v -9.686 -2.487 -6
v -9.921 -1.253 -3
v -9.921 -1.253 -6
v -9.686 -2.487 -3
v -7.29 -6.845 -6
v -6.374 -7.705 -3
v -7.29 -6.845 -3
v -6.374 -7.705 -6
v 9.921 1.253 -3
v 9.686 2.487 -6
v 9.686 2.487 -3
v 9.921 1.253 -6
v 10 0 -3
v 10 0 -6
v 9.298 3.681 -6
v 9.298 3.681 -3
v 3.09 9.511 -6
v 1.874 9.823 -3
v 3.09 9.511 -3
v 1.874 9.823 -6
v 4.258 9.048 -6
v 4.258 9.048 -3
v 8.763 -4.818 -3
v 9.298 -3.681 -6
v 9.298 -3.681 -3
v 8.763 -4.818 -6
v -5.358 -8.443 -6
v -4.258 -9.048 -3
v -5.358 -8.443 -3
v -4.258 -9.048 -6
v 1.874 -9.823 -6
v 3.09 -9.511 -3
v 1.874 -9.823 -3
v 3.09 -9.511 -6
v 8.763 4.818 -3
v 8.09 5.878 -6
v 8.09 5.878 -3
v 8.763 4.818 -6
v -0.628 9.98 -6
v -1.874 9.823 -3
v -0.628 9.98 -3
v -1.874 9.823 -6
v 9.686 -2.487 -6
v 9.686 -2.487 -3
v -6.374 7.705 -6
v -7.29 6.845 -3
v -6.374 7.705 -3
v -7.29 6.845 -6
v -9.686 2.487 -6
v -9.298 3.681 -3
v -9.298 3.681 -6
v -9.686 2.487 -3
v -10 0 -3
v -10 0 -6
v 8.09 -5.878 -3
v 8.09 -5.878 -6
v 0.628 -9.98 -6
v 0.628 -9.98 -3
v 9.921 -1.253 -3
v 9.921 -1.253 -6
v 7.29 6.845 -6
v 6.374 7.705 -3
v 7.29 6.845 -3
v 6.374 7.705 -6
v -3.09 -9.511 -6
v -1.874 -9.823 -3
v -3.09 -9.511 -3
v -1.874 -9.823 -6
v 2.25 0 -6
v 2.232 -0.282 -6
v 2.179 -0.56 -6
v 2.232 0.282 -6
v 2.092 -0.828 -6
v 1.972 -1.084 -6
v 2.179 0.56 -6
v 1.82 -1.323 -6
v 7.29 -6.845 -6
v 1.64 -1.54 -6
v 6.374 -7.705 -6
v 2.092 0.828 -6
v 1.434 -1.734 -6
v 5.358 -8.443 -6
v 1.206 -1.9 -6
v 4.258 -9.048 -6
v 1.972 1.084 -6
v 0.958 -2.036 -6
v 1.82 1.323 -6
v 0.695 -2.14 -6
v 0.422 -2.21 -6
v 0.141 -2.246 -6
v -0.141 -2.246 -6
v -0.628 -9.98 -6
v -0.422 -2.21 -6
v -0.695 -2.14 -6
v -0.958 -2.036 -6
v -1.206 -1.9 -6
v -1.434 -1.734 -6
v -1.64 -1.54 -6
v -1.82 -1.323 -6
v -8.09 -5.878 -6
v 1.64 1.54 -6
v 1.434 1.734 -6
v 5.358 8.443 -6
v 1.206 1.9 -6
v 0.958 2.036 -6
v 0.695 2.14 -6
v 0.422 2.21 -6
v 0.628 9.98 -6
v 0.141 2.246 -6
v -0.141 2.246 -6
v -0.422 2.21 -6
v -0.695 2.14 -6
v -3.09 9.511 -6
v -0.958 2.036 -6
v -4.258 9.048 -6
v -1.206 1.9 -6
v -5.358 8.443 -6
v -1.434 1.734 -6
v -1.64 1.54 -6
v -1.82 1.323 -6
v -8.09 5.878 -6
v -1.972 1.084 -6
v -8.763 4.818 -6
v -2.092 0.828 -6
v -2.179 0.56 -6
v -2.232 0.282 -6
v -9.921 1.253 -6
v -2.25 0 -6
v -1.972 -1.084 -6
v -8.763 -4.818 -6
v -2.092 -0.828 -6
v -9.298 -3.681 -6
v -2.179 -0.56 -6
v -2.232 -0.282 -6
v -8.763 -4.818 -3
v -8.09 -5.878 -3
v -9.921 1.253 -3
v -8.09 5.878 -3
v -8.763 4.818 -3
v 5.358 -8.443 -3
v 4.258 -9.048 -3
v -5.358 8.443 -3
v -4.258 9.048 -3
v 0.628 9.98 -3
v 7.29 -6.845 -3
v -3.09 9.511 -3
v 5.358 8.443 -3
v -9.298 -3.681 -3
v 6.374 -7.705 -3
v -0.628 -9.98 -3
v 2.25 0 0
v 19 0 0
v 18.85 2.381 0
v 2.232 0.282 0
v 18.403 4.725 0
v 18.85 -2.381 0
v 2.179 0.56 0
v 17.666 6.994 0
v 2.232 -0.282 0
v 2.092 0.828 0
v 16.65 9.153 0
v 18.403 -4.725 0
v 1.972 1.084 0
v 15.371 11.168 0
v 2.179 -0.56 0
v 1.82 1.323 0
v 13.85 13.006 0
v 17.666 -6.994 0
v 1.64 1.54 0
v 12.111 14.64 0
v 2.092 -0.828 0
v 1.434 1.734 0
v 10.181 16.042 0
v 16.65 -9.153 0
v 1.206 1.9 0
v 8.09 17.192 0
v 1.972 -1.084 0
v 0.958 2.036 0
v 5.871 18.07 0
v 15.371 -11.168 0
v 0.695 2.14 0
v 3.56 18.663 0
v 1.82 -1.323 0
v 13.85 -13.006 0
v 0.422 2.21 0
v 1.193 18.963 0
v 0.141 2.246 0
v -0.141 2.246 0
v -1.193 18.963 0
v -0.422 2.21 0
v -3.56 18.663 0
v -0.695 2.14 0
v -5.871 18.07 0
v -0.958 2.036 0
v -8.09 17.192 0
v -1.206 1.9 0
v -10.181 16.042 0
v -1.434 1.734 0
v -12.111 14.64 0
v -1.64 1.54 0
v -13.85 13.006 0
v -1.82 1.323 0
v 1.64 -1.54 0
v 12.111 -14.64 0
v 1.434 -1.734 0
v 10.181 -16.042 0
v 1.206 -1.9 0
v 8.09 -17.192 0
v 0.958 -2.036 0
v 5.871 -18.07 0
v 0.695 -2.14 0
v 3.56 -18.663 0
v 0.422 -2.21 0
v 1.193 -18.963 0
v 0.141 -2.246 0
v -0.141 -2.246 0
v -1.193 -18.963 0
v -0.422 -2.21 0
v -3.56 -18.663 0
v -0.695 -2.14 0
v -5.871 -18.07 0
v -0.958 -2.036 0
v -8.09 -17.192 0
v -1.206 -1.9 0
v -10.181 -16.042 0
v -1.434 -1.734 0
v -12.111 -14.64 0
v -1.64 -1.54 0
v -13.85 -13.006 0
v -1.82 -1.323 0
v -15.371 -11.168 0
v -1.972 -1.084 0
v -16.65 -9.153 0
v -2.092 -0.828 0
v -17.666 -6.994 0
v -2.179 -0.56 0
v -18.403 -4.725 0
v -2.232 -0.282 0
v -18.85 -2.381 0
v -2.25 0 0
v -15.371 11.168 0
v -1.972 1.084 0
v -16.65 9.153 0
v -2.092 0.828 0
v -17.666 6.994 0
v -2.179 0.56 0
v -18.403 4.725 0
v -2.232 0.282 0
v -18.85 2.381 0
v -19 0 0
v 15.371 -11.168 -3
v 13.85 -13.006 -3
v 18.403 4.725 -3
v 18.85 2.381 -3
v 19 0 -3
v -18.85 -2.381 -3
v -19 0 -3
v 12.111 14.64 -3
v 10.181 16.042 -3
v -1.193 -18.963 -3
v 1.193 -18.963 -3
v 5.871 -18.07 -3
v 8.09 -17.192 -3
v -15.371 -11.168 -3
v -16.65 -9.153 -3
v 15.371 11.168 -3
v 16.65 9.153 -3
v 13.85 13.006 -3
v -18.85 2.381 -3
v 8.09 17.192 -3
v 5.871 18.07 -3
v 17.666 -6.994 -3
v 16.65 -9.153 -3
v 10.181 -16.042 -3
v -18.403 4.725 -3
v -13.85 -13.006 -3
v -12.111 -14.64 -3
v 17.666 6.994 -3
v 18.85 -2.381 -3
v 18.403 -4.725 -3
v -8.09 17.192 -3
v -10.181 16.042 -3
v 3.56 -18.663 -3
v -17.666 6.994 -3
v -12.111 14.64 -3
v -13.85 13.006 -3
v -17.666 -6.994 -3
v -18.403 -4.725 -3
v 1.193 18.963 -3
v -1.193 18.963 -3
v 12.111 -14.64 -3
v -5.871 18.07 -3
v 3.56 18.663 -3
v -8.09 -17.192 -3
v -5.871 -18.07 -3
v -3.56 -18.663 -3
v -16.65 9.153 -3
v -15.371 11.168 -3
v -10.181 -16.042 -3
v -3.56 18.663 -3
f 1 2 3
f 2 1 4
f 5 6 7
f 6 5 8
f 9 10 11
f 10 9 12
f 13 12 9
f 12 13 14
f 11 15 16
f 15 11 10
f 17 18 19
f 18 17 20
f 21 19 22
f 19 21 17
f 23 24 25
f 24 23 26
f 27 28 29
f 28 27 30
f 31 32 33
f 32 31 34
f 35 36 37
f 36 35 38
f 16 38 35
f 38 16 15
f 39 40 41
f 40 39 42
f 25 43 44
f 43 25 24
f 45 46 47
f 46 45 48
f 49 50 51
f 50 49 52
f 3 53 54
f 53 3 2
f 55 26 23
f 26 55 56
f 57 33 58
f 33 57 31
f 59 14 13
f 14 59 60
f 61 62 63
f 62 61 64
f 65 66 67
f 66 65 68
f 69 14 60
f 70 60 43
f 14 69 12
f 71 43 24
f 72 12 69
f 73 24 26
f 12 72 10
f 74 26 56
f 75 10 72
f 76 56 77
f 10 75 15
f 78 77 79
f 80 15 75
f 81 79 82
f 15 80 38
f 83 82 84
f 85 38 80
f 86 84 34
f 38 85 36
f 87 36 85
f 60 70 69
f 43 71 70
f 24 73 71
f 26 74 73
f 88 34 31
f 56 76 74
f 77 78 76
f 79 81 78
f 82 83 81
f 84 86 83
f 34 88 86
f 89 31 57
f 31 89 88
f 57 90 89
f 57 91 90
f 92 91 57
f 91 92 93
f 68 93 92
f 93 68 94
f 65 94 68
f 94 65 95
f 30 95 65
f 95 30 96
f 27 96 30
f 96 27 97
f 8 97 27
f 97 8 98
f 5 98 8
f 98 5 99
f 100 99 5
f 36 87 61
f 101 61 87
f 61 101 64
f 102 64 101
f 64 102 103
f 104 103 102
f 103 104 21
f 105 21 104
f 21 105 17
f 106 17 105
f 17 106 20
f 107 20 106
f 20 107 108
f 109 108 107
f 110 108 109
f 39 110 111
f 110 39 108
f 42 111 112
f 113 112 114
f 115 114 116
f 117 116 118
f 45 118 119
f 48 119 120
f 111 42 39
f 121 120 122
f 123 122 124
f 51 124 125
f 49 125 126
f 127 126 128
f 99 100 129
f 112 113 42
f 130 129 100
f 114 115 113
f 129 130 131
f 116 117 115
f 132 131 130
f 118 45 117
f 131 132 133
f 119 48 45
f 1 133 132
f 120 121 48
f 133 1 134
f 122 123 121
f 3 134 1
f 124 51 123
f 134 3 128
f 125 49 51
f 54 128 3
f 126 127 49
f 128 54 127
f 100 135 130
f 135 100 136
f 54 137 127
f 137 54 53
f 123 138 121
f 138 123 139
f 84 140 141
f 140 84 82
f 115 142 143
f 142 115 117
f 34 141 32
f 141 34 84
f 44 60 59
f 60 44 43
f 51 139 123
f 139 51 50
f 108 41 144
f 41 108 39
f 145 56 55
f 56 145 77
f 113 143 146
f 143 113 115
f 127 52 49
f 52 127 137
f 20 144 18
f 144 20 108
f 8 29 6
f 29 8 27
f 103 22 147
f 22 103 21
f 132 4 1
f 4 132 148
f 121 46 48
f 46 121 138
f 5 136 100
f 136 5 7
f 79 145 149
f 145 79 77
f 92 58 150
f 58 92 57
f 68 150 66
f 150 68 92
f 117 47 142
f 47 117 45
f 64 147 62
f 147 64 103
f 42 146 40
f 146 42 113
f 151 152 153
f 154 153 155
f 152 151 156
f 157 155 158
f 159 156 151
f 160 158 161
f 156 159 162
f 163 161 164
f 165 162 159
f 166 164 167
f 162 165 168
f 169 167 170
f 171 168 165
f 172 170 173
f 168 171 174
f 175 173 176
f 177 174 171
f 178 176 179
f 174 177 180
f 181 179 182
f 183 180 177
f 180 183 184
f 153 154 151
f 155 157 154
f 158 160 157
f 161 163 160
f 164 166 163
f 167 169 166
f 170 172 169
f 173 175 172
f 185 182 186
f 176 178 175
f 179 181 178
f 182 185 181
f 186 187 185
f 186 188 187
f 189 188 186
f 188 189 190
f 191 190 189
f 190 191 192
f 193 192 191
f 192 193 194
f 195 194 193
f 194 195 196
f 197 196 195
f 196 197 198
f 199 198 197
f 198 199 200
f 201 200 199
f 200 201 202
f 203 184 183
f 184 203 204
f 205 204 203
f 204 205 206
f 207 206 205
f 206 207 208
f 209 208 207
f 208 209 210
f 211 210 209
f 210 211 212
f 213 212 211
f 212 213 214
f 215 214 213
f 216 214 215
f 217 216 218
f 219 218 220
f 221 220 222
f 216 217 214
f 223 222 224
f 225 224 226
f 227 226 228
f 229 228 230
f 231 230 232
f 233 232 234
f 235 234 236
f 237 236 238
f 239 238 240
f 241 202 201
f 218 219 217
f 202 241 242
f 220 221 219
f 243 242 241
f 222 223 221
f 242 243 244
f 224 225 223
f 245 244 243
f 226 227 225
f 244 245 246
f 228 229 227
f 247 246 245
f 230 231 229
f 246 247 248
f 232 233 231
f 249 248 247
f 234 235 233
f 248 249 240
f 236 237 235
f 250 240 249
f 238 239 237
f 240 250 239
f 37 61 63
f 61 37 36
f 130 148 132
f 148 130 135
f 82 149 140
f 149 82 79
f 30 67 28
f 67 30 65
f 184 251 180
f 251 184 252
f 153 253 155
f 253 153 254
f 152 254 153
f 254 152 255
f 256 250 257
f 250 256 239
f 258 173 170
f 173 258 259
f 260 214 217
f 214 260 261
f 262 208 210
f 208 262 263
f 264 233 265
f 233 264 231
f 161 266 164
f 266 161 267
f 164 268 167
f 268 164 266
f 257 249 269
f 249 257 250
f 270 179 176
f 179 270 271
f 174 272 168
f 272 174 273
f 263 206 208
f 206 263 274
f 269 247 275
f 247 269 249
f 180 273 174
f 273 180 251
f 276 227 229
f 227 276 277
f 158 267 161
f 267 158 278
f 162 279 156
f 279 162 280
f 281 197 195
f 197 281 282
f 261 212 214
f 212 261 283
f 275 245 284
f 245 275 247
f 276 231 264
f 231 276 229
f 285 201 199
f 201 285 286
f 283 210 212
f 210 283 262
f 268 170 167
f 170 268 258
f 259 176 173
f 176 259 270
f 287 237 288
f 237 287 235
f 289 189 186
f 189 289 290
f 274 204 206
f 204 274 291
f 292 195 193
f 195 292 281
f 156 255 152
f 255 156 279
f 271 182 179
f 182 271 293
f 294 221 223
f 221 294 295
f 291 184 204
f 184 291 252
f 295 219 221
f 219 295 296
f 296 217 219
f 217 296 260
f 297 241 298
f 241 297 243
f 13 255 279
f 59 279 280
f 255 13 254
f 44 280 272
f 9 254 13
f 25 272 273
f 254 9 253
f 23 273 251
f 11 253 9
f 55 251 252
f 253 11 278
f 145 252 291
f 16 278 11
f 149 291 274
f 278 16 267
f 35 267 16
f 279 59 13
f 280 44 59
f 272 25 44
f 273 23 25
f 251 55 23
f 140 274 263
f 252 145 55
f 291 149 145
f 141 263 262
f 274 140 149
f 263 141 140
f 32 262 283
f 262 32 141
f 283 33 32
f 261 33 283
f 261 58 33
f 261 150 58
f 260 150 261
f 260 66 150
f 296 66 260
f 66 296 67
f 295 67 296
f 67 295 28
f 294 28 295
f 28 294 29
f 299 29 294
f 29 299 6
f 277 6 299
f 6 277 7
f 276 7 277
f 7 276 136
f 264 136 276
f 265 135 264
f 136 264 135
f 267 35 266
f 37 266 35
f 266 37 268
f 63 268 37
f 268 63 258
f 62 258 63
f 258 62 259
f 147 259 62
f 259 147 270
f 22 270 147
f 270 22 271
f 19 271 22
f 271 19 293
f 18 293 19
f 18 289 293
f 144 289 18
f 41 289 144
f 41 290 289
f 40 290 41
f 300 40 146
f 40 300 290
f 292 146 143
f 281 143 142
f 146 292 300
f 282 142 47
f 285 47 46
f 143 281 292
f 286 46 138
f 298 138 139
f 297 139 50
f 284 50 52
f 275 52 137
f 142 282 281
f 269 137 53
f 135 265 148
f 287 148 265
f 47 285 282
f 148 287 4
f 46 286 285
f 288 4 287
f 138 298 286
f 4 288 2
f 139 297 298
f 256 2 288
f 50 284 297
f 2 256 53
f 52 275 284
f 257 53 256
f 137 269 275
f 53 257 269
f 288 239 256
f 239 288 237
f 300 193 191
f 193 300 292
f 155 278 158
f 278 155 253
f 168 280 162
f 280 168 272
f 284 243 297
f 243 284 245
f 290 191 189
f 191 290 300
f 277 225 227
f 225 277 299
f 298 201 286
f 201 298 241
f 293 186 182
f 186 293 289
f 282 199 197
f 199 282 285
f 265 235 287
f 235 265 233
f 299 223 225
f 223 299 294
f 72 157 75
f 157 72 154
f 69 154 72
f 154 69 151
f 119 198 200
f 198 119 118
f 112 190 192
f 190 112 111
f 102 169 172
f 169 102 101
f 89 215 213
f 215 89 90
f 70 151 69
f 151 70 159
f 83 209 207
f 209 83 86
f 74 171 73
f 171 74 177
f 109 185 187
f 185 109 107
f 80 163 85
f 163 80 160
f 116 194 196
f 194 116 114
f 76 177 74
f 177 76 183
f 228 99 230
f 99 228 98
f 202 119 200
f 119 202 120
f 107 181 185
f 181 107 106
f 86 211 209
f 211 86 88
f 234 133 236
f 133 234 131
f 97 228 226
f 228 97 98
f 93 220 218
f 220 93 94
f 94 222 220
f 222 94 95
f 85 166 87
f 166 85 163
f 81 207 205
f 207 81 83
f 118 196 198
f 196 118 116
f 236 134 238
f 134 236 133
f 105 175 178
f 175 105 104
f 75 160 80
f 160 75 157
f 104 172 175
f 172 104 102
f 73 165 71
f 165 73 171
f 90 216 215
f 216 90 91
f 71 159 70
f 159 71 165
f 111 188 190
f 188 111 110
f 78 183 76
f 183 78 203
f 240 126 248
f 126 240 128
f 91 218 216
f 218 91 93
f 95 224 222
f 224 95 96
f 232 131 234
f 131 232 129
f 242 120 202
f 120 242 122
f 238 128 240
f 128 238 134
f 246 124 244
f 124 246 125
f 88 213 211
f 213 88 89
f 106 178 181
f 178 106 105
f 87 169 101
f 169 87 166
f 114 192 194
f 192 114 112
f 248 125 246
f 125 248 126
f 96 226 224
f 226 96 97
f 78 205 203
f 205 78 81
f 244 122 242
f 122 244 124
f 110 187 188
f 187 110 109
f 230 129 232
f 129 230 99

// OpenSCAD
$fn = 50;


difference() {
	union() {
		translate(v = [0, 0, -6.0000000000]) {
			cylinder(h = 6, r = 10.0000000000);
		}
		translate(v = [0, 0, -3.0000000000]) {
			cylinder(h = 3, r = 19.0000000000);
		}
	}
	union() {
		#translate(v = [0, 0, -6]) {
			cylinder(h = 6, r = 2.2500000000);
		}
	}
}
